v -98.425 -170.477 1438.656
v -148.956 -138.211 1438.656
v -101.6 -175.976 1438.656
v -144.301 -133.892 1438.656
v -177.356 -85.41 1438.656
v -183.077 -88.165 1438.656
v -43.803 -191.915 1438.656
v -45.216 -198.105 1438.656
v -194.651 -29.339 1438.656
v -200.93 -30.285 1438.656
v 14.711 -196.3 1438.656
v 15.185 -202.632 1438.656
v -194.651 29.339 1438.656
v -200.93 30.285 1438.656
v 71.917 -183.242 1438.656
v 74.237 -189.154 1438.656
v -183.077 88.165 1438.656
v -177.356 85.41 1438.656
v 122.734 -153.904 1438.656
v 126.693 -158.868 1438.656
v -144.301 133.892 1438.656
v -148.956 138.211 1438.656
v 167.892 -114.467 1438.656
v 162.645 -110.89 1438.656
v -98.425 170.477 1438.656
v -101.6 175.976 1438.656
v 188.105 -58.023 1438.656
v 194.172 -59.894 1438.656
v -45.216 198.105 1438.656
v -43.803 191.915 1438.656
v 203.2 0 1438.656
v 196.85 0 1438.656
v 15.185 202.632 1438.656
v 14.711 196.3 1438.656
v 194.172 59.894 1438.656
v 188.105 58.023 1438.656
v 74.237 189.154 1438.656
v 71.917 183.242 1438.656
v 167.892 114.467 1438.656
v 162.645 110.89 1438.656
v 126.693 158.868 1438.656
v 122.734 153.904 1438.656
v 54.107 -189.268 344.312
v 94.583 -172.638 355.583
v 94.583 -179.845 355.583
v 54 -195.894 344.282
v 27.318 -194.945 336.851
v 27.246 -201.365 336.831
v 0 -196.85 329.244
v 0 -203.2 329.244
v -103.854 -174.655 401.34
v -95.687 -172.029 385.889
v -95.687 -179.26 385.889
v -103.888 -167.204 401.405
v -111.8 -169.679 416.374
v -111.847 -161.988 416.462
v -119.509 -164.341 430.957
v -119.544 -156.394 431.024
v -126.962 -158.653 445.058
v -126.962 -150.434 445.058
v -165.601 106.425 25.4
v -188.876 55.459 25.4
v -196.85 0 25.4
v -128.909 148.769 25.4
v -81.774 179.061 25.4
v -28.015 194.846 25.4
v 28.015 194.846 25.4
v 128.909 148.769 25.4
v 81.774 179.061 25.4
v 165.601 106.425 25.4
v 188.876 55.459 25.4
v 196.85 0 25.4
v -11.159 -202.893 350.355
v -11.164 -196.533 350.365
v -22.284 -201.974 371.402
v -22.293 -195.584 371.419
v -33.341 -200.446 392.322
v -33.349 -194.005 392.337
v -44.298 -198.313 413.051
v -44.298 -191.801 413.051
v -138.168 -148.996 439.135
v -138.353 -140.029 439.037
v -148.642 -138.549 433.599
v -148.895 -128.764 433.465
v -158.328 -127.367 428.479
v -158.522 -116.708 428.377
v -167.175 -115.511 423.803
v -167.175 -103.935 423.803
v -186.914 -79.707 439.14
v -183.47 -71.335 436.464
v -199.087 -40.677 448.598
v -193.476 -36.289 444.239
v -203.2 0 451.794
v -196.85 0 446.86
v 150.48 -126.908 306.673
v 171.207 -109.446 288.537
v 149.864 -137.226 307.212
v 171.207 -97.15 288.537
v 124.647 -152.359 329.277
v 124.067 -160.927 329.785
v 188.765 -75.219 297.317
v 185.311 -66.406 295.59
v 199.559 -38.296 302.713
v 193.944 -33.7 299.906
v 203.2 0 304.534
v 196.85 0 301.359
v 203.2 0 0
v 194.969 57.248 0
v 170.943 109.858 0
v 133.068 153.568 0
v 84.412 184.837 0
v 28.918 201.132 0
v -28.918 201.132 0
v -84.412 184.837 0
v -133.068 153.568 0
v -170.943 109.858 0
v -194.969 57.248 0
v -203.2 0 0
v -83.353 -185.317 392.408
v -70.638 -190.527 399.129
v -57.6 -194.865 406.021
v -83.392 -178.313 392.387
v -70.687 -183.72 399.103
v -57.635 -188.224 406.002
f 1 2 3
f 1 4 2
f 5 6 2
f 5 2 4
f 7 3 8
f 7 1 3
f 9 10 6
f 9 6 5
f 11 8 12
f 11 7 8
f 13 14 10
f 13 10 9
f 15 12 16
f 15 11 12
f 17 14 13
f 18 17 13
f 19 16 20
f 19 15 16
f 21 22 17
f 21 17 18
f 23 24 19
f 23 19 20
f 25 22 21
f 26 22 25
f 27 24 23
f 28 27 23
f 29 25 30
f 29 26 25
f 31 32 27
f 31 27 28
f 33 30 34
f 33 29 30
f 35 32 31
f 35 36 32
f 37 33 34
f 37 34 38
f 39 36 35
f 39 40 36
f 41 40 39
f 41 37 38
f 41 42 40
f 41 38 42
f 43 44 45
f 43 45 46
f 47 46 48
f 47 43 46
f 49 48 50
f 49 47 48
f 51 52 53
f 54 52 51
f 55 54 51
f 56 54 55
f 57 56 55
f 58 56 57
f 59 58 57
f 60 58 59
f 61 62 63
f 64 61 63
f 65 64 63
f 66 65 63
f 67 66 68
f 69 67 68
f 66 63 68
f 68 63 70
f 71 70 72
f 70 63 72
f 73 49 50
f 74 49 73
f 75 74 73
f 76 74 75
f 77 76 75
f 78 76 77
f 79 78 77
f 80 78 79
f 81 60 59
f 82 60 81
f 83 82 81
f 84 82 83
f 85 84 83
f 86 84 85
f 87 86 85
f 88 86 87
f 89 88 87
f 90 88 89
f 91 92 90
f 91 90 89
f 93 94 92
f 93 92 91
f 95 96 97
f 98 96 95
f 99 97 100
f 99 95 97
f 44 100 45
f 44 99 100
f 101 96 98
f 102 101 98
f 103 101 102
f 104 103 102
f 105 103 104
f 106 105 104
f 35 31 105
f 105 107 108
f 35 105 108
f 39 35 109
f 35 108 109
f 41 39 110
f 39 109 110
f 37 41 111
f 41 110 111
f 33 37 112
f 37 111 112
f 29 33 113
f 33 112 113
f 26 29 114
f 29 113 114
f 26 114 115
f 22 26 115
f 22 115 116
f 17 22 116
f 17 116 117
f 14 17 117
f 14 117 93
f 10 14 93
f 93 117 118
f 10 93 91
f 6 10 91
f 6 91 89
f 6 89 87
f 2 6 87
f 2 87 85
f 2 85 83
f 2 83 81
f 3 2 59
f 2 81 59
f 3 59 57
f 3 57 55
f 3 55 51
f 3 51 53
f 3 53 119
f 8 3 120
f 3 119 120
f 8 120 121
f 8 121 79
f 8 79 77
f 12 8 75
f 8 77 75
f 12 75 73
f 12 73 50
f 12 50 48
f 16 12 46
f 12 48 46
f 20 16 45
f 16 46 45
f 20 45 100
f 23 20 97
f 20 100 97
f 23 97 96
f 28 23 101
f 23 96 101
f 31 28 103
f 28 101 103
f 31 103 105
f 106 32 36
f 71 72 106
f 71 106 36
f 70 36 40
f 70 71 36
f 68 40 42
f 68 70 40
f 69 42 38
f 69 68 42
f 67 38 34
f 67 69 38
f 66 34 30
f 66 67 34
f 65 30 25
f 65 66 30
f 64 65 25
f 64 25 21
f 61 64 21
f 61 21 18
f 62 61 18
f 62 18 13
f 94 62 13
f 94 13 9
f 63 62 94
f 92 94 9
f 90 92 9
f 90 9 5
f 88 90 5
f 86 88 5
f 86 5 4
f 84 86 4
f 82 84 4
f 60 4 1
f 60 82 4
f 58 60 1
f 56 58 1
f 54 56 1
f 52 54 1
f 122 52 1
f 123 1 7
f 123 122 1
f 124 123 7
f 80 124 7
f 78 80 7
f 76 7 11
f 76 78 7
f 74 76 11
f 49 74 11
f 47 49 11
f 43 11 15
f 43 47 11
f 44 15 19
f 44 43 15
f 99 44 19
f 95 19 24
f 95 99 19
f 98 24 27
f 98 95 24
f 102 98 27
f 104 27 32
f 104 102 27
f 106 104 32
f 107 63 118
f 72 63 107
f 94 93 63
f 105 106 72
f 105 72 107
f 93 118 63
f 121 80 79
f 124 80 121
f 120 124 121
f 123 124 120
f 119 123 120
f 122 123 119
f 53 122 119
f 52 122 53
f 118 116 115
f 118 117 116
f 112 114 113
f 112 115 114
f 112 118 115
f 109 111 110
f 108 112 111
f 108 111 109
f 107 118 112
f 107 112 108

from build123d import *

# Parameters (mm, degrees)
F0_R     = 203.2
F0_R_2   = 196.85
F1_DEPTH = 1438.656
F2_R     = 196.85
F3_DEPTH = 25.4
F5_DEPTH = 508


with BuildPart() as f1:
    # F0 (on Top) → F1 (new body)
    with BuildSketch(Plane.XY):
        Circle(F0_R)
        Circle(F0_R_2, mode=Mode.SUBTRACT)
    extrude(amount=F1_DEPTH)

    # F2 (on face) → F3 (join)
    with BuildSketch(Plane(origin=(0, 0, 0), x_dir=(1, 0, 0), z_dir=(0, 0, -1))):
        Circle(F2_R)
    extrude(amount=-F3_DEPTH)

    # F4 (on Front) → F5 (cut)
    with BuildSketch(Plane.XZ):
        Polygon((-233.4638088942, 475.3084182739), (-262.1978223324, -27.536733076), (319.6658492088, -27.536733076), (319.6658492088, 288.5373830795), (228.6748290062, 317.2713816166), (171.2068021297, 288.5373830795), (94.5827811956, 355.5833995342), (0, 329.2438983917), (-44.2982390523, 413.0514264107), (-95.6870245125, 385.8887984614), (-126.9621838043, 445.0580531478), (-167.1748505567, 423.8027987949), align=None)
    extrude(amount=F5_DEPTH, mode=Mode.SUBTRACT)


solid = f1.part
